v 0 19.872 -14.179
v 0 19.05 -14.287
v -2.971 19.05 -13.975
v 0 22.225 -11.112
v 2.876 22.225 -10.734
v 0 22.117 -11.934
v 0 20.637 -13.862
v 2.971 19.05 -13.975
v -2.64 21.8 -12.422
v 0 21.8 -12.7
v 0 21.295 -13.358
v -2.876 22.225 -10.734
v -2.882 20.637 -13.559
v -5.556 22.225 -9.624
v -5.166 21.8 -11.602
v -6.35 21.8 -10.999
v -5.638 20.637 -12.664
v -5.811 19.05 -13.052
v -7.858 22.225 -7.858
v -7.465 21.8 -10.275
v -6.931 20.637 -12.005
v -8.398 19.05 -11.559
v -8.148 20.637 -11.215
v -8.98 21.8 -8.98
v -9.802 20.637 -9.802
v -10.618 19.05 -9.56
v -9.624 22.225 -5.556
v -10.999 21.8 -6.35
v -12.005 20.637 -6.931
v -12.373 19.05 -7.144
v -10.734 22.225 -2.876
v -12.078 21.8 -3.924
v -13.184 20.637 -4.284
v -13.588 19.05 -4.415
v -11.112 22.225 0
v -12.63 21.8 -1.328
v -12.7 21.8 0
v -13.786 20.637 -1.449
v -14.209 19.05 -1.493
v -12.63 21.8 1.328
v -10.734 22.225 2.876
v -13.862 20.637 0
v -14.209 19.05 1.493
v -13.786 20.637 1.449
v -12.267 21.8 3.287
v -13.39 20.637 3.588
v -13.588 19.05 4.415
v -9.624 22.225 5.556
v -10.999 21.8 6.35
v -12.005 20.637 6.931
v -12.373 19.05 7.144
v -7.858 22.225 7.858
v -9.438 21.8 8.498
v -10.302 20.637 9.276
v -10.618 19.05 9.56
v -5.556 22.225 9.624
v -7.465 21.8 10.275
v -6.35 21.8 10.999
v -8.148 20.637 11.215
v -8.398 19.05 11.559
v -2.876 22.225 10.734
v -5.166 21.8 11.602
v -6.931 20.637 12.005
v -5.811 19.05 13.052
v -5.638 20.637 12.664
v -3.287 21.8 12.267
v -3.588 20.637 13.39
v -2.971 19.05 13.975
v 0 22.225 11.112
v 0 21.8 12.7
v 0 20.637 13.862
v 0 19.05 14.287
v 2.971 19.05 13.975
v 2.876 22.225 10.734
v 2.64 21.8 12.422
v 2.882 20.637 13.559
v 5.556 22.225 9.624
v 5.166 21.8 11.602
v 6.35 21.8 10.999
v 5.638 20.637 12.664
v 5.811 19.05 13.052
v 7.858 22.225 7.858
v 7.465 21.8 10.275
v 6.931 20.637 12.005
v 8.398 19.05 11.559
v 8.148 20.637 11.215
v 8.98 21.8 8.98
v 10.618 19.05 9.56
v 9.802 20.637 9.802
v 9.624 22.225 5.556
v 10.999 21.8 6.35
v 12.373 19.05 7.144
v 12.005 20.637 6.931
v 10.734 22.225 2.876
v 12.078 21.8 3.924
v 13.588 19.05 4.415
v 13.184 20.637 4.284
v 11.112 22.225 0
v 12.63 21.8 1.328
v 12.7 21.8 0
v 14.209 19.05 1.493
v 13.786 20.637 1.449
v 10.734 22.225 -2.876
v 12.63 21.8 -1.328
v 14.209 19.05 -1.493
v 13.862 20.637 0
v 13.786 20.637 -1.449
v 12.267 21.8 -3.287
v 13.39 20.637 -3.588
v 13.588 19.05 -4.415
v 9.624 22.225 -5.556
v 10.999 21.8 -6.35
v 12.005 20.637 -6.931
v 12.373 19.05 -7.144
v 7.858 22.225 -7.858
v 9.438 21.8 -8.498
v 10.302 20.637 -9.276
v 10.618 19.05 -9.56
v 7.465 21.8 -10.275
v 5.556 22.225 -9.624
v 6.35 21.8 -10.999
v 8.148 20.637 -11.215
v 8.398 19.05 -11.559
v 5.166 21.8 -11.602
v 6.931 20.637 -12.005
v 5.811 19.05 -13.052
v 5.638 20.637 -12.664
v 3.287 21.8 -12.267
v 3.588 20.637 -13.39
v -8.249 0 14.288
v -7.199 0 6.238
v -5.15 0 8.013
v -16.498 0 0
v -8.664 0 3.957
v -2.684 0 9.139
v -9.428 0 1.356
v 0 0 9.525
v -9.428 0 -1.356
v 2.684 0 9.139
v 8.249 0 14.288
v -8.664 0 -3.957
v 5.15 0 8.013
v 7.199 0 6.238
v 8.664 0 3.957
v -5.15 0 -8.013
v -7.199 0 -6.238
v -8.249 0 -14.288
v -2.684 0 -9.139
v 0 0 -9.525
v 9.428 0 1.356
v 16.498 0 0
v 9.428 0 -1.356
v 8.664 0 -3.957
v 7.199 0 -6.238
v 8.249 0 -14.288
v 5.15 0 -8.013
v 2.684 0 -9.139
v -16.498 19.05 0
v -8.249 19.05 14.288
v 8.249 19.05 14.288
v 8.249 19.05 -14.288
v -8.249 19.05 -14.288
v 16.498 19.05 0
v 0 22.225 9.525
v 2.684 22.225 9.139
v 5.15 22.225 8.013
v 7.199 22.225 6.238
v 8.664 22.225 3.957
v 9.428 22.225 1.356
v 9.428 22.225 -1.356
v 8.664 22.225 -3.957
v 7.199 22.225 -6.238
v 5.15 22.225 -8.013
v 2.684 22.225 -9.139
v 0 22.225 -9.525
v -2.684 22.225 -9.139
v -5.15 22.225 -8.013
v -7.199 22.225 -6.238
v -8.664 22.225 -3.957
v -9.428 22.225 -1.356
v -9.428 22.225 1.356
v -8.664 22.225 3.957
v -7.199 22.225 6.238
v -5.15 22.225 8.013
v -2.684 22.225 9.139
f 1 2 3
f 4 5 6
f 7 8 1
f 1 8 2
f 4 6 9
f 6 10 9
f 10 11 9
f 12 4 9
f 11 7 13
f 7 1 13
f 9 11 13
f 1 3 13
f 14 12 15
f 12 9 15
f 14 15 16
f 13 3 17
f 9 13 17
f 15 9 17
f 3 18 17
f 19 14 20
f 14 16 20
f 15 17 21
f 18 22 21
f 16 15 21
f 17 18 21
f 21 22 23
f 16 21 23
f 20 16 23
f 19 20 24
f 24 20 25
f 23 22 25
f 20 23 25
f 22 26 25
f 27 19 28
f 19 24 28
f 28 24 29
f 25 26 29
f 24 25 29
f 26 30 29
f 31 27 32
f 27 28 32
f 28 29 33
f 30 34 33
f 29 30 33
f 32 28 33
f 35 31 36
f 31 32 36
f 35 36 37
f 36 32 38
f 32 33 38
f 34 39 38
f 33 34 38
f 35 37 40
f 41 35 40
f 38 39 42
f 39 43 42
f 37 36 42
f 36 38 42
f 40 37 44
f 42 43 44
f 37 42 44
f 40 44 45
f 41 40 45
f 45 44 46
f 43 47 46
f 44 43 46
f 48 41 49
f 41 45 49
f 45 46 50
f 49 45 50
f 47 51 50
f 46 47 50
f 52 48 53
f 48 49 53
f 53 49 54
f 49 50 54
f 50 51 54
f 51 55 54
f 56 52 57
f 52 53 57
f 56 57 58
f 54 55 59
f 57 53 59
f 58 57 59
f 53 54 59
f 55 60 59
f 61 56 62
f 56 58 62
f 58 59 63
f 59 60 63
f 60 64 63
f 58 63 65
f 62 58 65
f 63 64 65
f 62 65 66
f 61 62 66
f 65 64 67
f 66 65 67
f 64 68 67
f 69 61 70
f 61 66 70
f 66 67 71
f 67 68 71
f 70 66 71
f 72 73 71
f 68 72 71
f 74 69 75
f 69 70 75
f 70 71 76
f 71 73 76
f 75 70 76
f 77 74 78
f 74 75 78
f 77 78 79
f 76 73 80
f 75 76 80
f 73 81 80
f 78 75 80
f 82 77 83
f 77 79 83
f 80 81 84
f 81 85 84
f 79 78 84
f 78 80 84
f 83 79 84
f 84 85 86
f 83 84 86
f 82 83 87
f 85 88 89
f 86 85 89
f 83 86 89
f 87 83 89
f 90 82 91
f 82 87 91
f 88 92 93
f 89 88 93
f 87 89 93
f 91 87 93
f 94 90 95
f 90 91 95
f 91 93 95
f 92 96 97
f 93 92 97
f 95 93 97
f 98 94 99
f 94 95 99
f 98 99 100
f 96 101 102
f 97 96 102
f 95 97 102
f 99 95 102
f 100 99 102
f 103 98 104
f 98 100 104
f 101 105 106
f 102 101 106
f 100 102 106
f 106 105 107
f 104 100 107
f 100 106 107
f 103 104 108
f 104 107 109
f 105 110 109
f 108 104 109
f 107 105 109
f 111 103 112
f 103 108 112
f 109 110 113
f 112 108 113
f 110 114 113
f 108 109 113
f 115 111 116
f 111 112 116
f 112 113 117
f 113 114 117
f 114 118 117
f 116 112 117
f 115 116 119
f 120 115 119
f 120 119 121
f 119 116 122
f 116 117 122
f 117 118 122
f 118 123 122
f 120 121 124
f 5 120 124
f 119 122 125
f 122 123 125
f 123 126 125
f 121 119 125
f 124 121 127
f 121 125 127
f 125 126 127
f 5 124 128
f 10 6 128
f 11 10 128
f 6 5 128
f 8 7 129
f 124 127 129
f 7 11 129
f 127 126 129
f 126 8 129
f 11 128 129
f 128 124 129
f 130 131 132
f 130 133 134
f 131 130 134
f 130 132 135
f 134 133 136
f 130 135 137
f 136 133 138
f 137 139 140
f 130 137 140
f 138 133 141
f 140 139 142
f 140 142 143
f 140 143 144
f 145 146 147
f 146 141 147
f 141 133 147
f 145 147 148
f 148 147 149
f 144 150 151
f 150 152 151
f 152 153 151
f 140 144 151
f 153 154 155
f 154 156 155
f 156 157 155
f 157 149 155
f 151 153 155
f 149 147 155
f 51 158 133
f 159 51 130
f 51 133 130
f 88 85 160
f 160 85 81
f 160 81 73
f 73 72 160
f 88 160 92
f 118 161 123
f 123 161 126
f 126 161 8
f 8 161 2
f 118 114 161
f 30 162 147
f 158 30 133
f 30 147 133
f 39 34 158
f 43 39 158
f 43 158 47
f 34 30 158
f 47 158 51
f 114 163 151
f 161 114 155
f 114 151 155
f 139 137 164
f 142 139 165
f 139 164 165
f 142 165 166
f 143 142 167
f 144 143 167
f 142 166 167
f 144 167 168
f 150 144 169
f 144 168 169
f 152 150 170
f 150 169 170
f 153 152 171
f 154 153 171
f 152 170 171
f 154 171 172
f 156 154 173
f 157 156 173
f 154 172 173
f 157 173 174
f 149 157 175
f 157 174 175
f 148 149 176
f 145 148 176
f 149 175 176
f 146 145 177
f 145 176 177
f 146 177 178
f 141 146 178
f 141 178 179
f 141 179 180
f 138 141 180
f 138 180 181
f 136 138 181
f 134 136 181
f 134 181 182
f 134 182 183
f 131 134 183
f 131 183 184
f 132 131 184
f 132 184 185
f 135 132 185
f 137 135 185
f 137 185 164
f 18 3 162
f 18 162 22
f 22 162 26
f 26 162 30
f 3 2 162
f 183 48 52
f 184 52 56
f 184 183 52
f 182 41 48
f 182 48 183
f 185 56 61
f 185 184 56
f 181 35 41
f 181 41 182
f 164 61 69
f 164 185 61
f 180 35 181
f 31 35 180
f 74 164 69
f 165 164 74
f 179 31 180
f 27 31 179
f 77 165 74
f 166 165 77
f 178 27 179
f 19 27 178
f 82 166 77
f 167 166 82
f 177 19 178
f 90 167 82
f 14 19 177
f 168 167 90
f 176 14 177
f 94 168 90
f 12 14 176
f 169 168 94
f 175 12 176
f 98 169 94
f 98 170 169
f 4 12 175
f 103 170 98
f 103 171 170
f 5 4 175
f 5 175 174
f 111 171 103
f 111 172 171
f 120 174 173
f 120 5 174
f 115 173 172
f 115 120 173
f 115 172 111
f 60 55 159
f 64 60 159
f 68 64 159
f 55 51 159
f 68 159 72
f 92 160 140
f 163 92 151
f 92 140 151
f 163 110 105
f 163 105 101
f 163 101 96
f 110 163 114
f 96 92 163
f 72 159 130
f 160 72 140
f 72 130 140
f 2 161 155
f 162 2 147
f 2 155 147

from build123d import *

# Parameters (mm, degrees)
BOSS_EXTRU_1_DEPTH      = 22.225
ESQUISSE2_R             = 9.525
ENL_V_MAT_EXTRU_1_DEPTH = 32.148999282


with BuildPart() as part:
    # Esquisse1 → Boss.-Extru.1 (new body)
    with BuildSketch(Plane(origin=(0, 0, 0), x_dir=(1, 0, 0), z_dir=(0, 1, 0))):
        Polygon((8.248891971, 14.2875), (-8.248891971, 14.2875), (-16.497783942, 0), (-8.248891971, -14.2875), (8.248891971, -14.2875), (16.497783942, 0), align=None)
    extrude(amount=BOSS_EXTRU_1_DEPTH)

    # Esquisse2 → Enlèv. mat.-Extru.1 (cut, through all)
    with BuildSketch(Plane(origin=(0, 22.225, 0), x_dir=(1, 0, 0), z_dir=(0, 1, 0))):
        with Locations(Location((0, 0, 0), (0, 0, 270))):
            Circle(ESQUISSE2_R)
    extrude(amount=-ENL_V_MAT_EXTRU_1_DEPTH, mode=Mode.SUBTRACT)

    # Esquisse3 → Enlèvement de matière-Révolution1 (revolve, cut)
    with BuildSketch(Plane(origin=(0, 0, 0), x_dir=(0, 0, -1), z_dir=(1, 0, 0)), mode=Mode.PRIVATE) as enl_vement_de_mati_re_r_volution1_sk:
        with BuildLine():
            Line((-14.2875, 22.225), (-12.7, 22.225))
            Line((-12.7, 22.225), (-11.1125, 22.225))
            ThreePointArc((-11.1125, 22.225), (-13.35756403, 21.29506403), (-14.2875, 19.05))
            Line((-14.2875, 19.05), (-17.4625, 19.05))
            Line((-17.4625, 19.05), (-17.4625, 22.225))
            Line((-17.4625, 22.225), (-14.2875, 22.225))
        make_face()
    revolve(enl_vement_de_mati_re_r_volution1_sk.sketch.rotate(Axis((0, 0, 0), (0, 1, 0)), 180), axis=Axis((0, 0, 0), (0, 1, 0)), mode=Mode.SUBTRACT)


solid = part.part
